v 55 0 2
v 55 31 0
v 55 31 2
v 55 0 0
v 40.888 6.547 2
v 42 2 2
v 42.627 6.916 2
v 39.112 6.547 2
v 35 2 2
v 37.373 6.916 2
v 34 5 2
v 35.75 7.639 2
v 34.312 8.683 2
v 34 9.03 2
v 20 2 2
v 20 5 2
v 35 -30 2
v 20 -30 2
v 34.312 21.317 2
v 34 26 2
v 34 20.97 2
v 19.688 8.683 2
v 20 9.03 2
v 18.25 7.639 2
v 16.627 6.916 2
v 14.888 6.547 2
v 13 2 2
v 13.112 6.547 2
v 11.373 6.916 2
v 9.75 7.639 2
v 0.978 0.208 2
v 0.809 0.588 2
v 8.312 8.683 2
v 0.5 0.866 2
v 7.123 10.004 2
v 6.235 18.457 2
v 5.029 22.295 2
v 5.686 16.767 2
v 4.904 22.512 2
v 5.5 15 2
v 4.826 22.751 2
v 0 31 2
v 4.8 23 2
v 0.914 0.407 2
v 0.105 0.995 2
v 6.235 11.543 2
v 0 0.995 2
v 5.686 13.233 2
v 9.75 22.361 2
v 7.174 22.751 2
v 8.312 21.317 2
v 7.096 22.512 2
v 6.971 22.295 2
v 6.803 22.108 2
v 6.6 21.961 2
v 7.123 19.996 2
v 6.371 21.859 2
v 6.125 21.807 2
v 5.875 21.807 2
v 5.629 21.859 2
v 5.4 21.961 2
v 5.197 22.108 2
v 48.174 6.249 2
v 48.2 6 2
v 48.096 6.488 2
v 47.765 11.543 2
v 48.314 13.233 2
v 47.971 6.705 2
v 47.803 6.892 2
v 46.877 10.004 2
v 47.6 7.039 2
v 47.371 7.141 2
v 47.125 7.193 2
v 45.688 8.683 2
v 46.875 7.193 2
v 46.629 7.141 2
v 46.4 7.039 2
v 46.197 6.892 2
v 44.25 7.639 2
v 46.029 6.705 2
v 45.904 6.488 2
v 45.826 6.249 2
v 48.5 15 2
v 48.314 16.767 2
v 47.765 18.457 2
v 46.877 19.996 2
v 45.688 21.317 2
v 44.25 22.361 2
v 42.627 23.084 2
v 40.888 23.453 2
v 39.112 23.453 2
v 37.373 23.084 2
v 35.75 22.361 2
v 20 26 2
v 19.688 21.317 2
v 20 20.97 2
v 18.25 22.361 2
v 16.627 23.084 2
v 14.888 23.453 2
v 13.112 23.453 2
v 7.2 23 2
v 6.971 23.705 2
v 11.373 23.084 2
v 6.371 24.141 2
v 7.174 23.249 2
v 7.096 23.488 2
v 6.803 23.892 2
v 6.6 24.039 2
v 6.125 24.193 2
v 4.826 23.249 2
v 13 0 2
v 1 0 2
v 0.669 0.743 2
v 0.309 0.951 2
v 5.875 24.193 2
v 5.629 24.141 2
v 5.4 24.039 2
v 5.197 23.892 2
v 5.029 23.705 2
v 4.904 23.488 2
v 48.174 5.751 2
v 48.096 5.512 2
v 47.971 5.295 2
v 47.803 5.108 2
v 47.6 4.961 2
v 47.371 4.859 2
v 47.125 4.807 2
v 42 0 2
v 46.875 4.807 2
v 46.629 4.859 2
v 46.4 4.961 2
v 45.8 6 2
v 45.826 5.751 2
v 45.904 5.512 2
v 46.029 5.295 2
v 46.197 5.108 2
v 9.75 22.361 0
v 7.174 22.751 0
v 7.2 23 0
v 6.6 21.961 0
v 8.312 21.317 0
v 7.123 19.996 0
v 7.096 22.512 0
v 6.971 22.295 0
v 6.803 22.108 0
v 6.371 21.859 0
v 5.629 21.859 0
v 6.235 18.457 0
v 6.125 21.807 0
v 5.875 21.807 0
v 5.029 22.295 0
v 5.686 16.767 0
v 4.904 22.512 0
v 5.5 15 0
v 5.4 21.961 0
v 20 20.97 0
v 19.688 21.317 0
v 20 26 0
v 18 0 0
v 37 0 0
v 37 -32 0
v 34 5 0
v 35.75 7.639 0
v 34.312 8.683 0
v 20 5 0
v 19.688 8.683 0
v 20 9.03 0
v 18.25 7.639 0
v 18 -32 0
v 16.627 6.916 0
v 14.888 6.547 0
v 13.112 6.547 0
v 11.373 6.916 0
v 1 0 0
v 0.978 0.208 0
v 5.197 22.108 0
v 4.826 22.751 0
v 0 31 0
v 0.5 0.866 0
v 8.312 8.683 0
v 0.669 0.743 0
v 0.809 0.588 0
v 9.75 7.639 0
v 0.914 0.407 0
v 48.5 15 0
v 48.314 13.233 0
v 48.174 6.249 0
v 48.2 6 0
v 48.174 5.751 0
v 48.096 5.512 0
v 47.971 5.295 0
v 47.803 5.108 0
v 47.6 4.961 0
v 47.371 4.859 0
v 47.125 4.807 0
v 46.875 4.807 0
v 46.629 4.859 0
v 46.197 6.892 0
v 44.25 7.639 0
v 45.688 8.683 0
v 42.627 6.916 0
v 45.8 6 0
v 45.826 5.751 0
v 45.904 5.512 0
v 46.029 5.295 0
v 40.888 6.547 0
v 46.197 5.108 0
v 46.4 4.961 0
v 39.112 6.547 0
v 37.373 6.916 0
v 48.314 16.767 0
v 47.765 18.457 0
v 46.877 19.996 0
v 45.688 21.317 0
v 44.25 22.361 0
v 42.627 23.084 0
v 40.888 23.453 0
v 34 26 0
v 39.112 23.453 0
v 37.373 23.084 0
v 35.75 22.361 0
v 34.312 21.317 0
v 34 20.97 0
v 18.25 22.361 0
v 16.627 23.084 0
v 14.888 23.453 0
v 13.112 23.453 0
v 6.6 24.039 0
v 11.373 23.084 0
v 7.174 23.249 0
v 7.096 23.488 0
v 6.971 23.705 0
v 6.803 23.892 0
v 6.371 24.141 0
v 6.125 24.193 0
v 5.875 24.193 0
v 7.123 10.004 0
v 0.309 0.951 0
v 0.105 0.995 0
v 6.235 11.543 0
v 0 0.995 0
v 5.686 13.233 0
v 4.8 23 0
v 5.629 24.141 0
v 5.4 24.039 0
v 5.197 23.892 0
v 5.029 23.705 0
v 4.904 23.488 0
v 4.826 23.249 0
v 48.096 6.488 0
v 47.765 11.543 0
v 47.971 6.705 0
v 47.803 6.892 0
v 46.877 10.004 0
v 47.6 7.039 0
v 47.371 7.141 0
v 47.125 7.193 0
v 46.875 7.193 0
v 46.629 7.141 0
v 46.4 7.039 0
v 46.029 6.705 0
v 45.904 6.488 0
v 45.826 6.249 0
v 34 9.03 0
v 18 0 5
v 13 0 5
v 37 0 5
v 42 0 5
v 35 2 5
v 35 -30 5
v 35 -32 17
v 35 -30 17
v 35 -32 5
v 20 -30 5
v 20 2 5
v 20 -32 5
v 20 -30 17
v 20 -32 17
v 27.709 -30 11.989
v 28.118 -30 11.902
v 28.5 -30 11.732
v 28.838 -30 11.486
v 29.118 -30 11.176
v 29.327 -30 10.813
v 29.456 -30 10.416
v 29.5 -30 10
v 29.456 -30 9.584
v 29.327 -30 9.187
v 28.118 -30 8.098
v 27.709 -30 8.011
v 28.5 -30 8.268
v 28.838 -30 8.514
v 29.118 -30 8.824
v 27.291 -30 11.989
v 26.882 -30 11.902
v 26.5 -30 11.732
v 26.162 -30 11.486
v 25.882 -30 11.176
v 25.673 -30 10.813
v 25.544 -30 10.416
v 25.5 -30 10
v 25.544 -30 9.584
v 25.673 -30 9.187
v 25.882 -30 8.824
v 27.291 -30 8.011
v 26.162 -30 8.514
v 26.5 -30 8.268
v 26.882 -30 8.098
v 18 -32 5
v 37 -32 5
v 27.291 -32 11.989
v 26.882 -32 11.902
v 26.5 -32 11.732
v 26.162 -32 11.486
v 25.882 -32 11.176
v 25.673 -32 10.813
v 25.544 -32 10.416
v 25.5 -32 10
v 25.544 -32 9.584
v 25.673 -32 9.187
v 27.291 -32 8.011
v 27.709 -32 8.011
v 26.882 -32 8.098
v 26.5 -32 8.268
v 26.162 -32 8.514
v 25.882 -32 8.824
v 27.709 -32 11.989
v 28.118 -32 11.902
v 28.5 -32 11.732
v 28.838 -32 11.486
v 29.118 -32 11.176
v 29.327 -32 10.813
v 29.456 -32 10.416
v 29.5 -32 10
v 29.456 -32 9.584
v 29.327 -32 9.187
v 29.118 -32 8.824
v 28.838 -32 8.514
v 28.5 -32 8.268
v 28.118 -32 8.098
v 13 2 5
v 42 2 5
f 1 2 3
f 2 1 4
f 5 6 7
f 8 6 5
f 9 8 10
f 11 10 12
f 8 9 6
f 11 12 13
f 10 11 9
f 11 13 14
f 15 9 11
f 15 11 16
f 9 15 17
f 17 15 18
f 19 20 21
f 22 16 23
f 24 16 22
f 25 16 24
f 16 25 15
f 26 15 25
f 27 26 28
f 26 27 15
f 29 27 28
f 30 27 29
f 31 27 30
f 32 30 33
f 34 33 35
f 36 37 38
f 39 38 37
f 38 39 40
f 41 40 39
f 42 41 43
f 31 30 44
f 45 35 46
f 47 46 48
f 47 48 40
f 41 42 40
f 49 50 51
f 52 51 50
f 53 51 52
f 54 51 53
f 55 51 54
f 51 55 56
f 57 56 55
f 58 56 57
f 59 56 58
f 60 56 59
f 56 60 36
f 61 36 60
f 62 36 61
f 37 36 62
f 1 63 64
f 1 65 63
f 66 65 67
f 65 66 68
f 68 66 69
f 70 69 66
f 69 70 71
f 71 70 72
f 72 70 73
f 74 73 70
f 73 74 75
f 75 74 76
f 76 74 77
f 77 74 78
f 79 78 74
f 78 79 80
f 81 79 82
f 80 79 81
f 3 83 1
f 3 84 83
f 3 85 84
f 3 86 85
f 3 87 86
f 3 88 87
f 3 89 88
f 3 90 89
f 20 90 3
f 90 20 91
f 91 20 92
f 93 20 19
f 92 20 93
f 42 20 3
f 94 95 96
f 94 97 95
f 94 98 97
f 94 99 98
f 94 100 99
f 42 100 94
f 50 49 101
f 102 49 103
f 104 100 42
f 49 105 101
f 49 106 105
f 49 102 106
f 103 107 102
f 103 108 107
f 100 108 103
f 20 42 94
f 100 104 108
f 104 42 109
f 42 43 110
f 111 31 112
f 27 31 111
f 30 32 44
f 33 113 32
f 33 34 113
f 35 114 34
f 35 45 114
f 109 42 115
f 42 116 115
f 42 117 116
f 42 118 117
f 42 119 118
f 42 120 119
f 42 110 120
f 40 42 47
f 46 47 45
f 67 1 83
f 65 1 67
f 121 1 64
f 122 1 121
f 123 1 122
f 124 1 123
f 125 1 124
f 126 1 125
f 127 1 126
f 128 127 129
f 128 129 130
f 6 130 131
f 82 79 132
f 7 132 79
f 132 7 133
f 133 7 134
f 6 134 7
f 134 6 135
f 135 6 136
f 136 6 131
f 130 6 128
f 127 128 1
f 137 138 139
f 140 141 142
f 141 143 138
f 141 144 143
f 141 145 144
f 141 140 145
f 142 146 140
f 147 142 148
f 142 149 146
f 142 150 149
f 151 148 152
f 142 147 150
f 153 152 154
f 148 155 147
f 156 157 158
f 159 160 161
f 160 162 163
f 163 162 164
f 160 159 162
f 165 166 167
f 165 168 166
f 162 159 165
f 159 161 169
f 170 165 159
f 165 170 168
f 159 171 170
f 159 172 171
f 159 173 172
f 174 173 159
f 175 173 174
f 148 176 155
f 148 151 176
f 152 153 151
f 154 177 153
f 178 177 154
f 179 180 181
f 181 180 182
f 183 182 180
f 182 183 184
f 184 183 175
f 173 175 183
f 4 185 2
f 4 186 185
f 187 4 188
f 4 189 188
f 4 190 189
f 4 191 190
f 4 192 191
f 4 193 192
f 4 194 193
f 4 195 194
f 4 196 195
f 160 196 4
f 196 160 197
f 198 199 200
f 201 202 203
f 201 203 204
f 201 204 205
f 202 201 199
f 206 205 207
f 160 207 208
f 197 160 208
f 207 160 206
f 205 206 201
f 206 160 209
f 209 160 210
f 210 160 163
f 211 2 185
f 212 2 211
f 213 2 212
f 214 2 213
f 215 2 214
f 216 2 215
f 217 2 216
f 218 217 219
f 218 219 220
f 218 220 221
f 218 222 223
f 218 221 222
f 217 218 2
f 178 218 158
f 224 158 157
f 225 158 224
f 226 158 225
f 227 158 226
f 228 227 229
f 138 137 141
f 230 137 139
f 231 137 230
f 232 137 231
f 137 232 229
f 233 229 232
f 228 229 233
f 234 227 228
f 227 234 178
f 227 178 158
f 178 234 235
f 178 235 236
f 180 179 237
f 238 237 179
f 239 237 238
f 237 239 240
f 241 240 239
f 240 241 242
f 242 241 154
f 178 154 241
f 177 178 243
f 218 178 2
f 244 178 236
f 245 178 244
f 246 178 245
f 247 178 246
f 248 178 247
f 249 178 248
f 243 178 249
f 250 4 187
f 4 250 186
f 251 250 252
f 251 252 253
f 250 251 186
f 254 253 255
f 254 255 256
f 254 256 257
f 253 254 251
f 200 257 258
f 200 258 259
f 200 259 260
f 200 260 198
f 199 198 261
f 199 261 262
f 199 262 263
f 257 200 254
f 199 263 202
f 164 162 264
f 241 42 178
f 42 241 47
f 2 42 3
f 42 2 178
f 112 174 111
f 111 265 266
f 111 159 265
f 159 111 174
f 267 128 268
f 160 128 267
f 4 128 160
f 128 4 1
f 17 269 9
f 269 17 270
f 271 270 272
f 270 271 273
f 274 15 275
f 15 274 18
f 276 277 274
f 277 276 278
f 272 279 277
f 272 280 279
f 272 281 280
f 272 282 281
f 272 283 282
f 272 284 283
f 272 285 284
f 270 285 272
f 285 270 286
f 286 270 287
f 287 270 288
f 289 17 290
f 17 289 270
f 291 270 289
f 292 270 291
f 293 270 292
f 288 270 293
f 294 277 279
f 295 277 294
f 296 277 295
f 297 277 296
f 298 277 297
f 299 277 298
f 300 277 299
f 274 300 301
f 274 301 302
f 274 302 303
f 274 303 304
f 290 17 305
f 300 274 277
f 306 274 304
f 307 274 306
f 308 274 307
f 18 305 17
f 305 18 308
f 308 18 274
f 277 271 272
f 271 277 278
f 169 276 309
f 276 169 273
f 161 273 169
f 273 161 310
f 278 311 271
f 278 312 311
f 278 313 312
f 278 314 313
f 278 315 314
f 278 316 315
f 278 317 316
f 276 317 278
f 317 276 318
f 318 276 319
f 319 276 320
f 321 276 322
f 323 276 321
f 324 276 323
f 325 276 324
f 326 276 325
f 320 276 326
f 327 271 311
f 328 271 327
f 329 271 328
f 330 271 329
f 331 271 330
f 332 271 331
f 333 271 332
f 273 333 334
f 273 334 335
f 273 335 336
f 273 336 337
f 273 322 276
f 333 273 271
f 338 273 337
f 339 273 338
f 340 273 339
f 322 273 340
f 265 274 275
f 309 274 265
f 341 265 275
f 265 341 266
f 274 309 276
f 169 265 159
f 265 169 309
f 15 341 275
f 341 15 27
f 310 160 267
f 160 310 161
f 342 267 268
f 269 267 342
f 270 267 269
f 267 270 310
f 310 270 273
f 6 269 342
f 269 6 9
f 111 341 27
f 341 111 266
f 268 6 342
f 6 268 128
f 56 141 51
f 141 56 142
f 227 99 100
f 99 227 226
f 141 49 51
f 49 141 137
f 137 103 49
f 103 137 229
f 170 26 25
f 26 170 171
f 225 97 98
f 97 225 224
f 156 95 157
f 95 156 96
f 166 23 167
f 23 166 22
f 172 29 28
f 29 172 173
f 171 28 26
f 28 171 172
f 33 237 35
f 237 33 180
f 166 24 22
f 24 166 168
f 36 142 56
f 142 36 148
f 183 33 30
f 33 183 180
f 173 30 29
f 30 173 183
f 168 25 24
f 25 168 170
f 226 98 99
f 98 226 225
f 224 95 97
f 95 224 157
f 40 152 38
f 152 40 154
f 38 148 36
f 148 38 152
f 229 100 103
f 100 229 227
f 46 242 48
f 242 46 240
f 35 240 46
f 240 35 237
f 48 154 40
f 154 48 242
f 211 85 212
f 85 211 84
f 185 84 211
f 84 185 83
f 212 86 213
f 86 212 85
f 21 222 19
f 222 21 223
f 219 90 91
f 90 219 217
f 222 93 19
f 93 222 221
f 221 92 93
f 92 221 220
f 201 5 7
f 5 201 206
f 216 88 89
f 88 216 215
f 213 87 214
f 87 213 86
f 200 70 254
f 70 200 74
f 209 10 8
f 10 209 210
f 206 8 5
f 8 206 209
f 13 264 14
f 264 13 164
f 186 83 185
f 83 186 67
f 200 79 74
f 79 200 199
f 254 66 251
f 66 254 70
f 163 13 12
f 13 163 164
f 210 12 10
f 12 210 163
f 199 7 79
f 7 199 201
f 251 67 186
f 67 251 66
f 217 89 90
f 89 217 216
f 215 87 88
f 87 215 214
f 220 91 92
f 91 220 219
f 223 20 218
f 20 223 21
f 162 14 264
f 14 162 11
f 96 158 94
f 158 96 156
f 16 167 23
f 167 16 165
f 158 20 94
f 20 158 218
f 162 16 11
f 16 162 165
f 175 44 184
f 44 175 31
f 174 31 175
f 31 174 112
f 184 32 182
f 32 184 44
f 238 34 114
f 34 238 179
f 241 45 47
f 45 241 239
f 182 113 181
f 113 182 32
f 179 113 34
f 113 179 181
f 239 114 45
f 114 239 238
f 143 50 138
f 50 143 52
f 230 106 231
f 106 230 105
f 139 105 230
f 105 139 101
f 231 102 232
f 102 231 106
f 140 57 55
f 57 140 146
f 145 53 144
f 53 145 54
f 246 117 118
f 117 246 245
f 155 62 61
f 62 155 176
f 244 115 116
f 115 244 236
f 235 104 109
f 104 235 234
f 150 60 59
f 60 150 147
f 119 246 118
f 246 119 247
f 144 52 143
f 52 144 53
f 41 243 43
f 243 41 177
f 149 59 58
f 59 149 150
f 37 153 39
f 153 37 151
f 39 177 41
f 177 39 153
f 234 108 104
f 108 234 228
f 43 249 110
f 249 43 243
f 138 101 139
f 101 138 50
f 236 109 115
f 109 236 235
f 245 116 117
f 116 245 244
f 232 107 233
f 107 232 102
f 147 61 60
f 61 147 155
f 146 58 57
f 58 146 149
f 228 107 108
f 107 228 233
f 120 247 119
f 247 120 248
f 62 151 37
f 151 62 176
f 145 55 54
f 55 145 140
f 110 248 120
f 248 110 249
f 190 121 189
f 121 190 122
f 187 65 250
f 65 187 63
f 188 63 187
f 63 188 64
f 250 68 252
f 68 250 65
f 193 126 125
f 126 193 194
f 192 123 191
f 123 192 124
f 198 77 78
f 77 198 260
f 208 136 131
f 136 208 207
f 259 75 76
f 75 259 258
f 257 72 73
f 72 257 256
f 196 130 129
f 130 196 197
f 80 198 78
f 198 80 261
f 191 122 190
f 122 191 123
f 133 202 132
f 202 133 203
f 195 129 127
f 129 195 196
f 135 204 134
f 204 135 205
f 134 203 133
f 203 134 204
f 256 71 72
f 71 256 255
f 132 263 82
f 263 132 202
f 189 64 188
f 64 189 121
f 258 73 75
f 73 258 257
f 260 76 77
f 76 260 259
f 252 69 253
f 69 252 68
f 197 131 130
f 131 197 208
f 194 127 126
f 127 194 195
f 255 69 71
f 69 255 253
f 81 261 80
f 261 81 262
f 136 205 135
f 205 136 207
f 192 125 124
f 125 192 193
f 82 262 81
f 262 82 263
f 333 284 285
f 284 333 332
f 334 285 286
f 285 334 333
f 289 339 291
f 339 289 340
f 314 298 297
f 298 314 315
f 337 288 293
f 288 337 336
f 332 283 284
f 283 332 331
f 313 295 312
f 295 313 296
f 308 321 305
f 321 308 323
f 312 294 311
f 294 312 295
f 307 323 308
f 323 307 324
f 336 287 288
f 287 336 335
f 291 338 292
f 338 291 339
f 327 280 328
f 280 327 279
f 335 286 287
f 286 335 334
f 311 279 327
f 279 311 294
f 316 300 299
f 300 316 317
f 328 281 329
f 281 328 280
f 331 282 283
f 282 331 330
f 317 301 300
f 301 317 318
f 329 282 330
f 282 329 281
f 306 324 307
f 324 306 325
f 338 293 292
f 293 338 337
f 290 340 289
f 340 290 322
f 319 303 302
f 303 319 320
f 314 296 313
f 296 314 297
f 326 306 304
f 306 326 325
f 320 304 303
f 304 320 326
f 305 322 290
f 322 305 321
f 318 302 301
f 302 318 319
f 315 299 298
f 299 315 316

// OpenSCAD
difference () {
 union () {
  cube ([55, 31, 2]);
  translate ([20, -30, 0]) 
    cube ([15, 30, 2]);
  translate ([20, -32, 0]) 
    cube ([15, 2, 17]); 
  translate ([18, -32, 0]) 
    cube ([2, 34, 5]); 
  translate ([35, -32, 0]) 
    cube ([2, 34, 5]); 
  translate ([13, 0, 0]) 
    cube ([5, 2, 5]); 
  translate ([37, 0, 0]) 
    cube ([5, 2, 5]); 

}
 union () {
translate ([14, 15, 0]) 
   cylinder  (h=2, r=8.5 , $fs=0.1 );
  translate ([40, 15, 0]) 
     cylinder  (h=2, r=8.5 , $fs=0.1 );
  translate ([20, 5, 0]) 
     cube ([14, 21, 2]);
  //translate ([6, 6, 0]) 
     cylinder  (h=2, r=1 , $fs=0.1 );
  translate ([6, 23, 0]) 
     cylinder  (h=2, r=1.2 , $fs=0.1 );
  translate ([47, 6, 0]) 
     cylinder  (h=2, r=1.2 , $fs=0.1 );
  //translate ([48, 24, 0]) 
     cylinder  (h=2, r=1 , $fs=0.1 );
translate ([27.5, -30, 10])  {
 rotate ([90, 0, 0])
    cylinder  (h=2, r=2, $fs=0.1);
}
}
}
